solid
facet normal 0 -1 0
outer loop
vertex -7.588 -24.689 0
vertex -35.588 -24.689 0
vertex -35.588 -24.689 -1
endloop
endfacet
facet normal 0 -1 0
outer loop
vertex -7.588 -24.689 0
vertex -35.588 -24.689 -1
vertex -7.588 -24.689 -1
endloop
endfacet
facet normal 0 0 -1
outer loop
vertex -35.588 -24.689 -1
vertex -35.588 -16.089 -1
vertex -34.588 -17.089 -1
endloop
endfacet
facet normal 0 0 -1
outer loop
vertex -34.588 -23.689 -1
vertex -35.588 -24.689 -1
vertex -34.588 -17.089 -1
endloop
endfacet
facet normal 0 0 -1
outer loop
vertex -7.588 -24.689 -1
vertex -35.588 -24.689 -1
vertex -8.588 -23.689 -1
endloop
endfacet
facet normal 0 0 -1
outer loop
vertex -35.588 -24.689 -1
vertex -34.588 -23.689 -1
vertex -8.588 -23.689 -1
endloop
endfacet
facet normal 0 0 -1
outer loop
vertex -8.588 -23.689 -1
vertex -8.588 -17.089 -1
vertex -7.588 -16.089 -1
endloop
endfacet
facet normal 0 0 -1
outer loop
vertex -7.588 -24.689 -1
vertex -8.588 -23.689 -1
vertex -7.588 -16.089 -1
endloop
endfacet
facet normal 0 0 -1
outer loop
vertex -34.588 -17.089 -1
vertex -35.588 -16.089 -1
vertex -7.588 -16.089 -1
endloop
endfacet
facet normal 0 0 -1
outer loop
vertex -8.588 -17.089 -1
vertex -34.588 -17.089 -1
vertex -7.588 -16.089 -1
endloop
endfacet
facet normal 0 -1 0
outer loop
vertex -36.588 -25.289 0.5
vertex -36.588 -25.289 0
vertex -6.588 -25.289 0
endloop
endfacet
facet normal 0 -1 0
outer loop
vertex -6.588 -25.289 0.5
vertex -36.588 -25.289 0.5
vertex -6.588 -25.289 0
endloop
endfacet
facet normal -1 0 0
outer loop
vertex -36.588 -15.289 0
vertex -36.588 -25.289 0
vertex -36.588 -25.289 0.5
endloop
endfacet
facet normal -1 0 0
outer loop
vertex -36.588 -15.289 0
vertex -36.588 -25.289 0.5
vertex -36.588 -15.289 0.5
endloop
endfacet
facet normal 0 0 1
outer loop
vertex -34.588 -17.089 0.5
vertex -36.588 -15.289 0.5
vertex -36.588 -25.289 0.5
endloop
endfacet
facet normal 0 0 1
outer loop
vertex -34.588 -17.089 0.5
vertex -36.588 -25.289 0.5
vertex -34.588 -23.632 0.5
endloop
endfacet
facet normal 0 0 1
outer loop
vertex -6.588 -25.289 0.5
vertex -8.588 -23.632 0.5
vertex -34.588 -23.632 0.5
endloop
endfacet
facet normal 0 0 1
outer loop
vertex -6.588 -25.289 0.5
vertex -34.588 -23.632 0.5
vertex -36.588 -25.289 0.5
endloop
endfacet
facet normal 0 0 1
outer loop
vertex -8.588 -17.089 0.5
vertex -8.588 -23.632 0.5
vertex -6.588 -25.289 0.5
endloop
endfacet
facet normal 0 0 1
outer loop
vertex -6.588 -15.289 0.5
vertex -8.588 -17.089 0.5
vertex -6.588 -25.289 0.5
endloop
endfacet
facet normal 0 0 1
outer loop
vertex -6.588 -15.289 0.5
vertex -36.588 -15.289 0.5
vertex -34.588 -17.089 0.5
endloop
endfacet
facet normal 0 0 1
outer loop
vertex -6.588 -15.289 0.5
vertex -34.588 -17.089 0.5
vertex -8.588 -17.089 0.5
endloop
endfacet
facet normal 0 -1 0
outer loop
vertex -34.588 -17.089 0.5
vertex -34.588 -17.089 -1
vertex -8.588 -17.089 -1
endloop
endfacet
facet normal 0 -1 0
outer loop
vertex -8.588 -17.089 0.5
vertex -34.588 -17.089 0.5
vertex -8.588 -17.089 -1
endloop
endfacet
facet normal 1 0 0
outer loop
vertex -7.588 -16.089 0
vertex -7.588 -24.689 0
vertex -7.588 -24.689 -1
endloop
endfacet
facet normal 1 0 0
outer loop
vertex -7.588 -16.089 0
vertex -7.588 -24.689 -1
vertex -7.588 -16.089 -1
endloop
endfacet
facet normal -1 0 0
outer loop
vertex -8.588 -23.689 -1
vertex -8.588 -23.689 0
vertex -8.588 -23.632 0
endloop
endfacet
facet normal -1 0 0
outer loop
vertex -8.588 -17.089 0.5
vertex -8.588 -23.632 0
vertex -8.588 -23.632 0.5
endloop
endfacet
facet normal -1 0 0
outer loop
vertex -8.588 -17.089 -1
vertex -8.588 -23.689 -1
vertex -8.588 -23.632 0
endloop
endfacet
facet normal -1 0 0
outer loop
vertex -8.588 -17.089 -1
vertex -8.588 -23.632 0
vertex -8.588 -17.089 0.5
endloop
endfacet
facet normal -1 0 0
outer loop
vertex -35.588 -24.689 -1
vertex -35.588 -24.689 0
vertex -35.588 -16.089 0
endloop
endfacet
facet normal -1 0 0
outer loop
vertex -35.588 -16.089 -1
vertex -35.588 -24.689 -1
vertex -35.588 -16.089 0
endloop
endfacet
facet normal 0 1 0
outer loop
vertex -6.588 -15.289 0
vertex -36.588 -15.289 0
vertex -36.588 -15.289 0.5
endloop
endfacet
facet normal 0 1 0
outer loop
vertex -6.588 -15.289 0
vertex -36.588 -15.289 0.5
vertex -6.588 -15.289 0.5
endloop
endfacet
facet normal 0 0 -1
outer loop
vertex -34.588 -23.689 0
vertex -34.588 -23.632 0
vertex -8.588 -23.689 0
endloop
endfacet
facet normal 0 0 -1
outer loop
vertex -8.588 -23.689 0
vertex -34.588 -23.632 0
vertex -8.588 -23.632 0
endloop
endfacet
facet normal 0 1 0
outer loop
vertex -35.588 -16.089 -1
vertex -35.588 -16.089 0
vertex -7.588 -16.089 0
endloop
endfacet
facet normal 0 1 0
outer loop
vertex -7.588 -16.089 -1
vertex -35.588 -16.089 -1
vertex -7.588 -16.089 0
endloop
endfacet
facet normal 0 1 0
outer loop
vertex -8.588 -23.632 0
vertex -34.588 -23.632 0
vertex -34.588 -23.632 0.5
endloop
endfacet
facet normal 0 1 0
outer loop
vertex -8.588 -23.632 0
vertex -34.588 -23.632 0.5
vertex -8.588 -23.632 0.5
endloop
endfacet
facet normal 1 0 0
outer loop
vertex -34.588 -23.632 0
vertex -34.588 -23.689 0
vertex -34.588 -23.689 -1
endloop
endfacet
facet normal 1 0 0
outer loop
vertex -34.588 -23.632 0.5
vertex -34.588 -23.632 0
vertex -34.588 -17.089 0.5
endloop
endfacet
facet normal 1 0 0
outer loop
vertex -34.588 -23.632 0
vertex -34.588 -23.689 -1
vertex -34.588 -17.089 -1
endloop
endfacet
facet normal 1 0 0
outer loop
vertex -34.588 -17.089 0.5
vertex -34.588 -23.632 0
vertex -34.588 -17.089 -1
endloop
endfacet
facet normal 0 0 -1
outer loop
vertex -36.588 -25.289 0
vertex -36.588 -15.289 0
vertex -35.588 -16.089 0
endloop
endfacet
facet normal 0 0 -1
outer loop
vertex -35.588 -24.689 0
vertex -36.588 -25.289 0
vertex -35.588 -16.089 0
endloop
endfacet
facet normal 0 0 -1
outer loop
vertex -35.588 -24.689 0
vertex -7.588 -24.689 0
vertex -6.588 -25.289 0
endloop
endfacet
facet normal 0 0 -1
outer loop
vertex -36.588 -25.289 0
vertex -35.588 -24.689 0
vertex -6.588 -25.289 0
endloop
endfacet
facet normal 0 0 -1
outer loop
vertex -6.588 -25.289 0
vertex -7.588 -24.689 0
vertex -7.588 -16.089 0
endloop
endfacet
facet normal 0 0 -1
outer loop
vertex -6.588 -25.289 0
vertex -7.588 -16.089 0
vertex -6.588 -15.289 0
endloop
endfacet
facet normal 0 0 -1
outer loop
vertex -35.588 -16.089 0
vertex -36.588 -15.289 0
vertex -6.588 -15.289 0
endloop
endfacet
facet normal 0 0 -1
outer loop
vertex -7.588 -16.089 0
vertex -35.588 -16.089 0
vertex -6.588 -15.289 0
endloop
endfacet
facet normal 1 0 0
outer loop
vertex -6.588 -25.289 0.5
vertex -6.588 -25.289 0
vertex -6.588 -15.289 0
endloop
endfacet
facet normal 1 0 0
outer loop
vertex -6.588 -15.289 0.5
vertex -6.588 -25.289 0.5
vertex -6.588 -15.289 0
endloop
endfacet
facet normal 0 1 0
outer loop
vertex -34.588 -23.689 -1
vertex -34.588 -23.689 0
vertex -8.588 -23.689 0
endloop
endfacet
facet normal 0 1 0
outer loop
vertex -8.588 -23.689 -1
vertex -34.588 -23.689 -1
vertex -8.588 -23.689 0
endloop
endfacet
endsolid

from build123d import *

# Parameters (mm, degrees)
SKETCH_1_W      = 28
SKETCH_1_H      = 8.6
SKETCH_1_W_2    = 26
SKETCH_1_H_2    = 6.6
EXTRUDE_1_DEPTH = 1
SKETCH_2_W      = 30
SKETCH_2_H      = 10
SKETCH_2_W_2    = 26
SKETCH_2_H_2    = 6.54302186
EXTRUDE_2_DEPTH = 0.5


with BuildPart() as part:
    # Эскиз1 → Бобышка-Вытянуть1 (new body)
    with BuildSketch(Plane.XY):
        with Locations((-21.588376798, -20.389004385)):
            Rectangle(SKETCH_1_W, SKETCH_1_H)
        with Locations((-21.588376798, -20.389004385)):
            Rectangle(SKETCH_1_W_2, SKETCH_1_H_2, mode=Mode.SUBTRACT)
    extrude(amount=-EXTRUDE_1_DEPTH)

    # Эскиз2 → Бобышка-Вытянуть2 (add)
    with BuildSketch(Plane.XY):
        with Locations((-21.588376798, -20.289004385)):
            Rectangle(SKETCH_2_W, SKETCH_2_H)
        with Locations((-21.588376798, -20.360515315)):
            Rectangle(SKETCH_2_W_2, SKETCH_2_H_2, mode=Mode.SUBTRACT)
    extrude(amount=EXTRUDE_2_DEPTH)


solid = part.part
